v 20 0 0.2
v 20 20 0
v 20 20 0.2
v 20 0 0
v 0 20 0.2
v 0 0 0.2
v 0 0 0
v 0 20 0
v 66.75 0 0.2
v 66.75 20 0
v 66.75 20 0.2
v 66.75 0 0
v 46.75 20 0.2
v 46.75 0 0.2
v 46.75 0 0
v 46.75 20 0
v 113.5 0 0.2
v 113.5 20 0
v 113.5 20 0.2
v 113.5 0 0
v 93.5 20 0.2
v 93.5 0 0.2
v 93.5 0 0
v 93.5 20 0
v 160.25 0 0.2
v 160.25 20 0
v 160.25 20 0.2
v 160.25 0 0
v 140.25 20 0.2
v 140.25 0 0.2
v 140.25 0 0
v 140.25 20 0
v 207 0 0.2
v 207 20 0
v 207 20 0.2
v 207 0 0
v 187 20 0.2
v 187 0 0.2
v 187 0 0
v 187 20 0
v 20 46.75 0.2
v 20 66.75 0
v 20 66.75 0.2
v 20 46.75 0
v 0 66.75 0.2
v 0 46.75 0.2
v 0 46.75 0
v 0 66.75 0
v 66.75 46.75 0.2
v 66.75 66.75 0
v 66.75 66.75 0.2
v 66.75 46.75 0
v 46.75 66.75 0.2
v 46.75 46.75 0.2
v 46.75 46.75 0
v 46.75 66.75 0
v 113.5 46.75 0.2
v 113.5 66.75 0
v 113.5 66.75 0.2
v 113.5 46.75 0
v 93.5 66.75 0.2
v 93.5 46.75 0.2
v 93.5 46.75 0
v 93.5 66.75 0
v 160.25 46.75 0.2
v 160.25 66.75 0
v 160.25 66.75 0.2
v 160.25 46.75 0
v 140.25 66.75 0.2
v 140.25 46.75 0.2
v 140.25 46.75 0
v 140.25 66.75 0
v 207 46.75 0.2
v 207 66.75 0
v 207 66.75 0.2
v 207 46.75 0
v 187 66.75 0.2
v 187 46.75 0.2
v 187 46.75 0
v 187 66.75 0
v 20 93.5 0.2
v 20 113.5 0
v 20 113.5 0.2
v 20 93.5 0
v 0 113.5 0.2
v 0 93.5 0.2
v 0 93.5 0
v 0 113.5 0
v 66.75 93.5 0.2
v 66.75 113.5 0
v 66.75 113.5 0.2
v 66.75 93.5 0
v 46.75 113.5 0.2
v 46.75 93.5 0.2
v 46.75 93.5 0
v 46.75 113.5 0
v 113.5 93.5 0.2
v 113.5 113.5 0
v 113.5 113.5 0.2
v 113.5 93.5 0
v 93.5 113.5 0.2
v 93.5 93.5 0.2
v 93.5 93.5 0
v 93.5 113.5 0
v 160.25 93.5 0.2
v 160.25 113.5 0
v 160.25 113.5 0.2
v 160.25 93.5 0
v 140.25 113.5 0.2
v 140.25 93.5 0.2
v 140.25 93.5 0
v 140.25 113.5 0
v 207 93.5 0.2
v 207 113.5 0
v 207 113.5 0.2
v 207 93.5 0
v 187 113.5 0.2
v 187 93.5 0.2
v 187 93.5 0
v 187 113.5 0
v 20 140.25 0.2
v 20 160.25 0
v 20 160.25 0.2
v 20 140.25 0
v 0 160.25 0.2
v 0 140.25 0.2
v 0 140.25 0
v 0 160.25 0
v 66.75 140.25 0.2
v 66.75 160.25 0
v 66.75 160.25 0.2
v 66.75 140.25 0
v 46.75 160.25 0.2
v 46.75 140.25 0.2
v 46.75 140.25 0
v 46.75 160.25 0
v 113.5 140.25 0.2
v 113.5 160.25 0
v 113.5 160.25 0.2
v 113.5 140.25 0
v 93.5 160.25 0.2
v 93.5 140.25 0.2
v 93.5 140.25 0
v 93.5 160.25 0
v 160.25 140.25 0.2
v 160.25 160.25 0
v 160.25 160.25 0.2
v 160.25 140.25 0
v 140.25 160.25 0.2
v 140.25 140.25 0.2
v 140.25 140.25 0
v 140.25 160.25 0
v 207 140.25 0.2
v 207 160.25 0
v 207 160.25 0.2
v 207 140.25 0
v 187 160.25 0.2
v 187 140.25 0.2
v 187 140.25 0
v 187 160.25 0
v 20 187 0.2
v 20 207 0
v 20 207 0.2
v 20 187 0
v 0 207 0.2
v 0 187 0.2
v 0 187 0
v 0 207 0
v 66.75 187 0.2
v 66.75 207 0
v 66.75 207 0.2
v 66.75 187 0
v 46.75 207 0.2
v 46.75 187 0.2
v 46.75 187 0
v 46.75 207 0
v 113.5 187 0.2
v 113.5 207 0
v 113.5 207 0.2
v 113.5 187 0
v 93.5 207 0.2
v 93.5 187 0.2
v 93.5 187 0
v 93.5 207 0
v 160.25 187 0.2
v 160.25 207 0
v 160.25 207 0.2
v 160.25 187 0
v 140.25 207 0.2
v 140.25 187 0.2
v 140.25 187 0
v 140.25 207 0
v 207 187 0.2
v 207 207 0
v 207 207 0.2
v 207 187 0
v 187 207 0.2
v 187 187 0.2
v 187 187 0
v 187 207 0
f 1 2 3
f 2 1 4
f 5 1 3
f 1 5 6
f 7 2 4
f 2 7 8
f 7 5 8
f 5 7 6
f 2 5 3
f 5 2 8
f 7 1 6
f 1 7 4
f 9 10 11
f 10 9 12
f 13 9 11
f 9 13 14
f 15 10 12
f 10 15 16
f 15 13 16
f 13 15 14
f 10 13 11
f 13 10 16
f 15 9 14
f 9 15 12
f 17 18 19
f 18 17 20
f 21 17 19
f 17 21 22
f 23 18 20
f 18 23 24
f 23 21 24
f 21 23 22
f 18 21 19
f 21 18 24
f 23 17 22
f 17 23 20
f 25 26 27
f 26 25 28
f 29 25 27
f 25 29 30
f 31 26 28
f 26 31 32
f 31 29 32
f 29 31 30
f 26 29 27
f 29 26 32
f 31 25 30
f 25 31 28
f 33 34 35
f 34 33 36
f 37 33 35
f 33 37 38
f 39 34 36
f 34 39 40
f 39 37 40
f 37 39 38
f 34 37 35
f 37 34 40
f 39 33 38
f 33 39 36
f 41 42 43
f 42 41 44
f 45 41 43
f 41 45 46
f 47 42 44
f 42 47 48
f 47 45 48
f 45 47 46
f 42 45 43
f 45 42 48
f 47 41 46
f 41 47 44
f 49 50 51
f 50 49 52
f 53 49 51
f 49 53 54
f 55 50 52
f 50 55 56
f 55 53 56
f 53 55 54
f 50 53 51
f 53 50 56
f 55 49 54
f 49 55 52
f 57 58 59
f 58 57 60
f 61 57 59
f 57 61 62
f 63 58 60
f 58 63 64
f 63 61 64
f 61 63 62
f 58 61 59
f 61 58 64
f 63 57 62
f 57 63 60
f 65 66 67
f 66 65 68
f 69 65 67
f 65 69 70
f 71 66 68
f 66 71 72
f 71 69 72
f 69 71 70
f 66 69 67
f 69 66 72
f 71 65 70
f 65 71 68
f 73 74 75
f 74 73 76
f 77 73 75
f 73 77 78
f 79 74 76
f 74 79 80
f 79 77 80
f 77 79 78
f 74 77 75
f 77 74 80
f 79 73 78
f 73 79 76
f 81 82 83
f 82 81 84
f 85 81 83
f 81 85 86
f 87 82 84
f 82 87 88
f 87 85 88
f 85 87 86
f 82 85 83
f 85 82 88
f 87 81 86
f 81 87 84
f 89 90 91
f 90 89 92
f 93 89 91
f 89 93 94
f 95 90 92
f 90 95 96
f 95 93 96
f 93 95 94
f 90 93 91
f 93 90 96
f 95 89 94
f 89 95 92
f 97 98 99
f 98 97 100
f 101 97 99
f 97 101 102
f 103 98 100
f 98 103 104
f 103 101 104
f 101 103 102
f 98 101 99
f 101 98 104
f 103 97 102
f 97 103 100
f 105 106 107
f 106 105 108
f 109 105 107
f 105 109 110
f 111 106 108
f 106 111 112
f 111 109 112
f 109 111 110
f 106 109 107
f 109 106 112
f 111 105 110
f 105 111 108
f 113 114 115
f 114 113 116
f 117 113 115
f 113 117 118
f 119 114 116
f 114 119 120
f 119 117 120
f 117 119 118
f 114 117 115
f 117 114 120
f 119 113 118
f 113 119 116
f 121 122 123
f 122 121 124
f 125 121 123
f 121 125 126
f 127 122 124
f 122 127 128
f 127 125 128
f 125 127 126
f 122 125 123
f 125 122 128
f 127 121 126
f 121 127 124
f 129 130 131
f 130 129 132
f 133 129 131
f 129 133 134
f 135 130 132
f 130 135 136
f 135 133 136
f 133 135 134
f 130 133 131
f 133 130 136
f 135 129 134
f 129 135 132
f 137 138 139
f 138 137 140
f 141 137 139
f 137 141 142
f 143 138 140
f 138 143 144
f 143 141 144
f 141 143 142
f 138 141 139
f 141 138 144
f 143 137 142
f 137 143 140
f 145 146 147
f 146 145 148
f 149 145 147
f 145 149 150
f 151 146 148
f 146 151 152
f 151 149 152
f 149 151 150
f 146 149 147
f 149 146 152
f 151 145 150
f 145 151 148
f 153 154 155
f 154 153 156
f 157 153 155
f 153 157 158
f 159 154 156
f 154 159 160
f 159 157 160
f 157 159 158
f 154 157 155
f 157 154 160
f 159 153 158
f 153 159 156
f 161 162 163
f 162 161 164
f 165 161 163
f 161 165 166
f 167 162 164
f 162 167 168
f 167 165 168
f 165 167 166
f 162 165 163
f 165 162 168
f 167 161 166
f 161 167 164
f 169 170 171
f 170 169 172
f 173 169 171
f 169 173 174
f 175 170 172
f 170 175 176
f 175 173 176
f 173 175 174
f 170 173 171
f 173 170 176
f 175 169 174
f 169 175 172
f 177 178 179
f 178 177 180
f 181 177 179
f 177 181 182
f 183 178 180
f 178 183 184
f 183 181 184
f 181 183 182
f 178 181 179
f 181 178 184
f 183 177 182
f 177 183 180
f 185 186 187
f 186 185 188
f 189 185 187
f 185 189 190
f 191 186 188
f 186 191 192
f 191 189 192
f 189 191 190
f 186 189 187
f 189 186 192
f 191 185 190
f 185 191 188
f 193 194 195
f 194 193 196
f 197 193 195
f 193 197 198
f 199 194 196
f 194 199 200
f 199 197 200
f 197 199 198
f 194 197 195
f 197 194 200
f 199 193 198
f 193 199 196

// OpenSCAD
/*
Customizable Bed Leveling Test
Version 1.1
Written by kenwebart

Customize your own bed leveling test.

Please update your settings below.

License: Creative Commons Attribution-ShareAlike 4.0 International License
This is a human-readable summary of the full license below.

Under this license, you are free to:
Share - copy and redistribute the material in any medium or format
Adapt - remix, transform, and build upon the material for any purpose, even commercially.
The licensor cannot revoke these freedoms as long as you follow the license terms.

License terms

Attribution - You must give appropriate credit, provide a link to the license, and indicate if changes were made. You may do so in any reasonable manner, but not in any way that suggests the licensor endorses you or your use.
ShareAlike - If you remix, transform, or build upon the material, you must distribute your contributions under the same license as the original.
No additional restrictions - You may not apply legal terms or technological measures that legally restrict others from doing anything the license permits.

Notices

You do not have to comply with the license for elements of the material in the public domain or where your use is permitted by an applicable exception or limitation.
//No warranties are given. The license may not give you all of the permissions necessary for your intended use. For example, other rights such as publicity, privacy, or moral rights may limit how you use the material.
*/

/*
Use at your own risk.

THIS SOFTWARE IS PROVIDED BY THE COPYRIGHT HOLDERS AND CONTRIBUTORS "AS IS"
AND ANY EXPRESS OR IMPLIED WARRANTIES, INCLUDING, BUT NOT LIMITED TO,
THE IMPLIED WARRANTIES OF MERCHANTABILITY AND FITNESS FOR A PARTICULAR
PURPOSE ARE DISCLAIMED. IN NO EVENT SHALL THE COPYRIGHT OWNER OR CONTRIBUTORS
BE LIABLE FOR ANY DIRECT, INDIRECT, INCIDENTAL, SPECIAL, EXEMPLARY, OR
CONSEQUENTIAL DAMAGES (INCLUDING, BUT NOT LIMITED TO, PROCUREMENT OF
SUBSTITUTE GOODS OR SERVICES; LOSS OF USE, DATA, OR PROFITS; OR BUSINESS
INTERRUPTION) HOWEVER CAUSED AND ON ANY THEORY OF LIABILITY, WHETHER
IN CONTRACT, STRICT LIABILITY, OR TORT (INCLUDING NEGLIGENCE OR OTHERWISE)
ARISING IN ANY WAY OUT OF THE USE OF THIS SOFTWARE, EVEN IF ADVISED OF THE
POSSIBILITY OF SUCH DAMAGE.

*/

//width in mm.
printer_x = 210;

//depth in mm.
printer_y = 210; 

//height in mm.
printer_z = 205;

//diameter in mm.
nozzle = 0.4;

//height in mm.
layerheight = 0.2;

//Bild plate margin in mm.
margin = 1.5;

//in  mm. If needed, try 15.
skirt_padding = 0;

//Choose a shape
shape = 0; // [0,1,2,3]

//calculate space  
x = printer_x - (margin*2) - (skirt_padding*2);
y = printer_y - (margin*2) - (skirt_padding*2);
z = printer_z - margin;


//module for lines
 module line(start, end) {
    hull() {
        translate(start) linear_extrude(height = layerheight) circle(nozzle); 
        translate(end) linear_extrude(height = layerheight) circle(nozzle); 
    }
}


if (shape == 0) {
		//set cube size
		a = 20;
		cubesize = [a,a,layerheight];
		
		//calc space between cubes
		cubesInRow = 5;
		lengthCubes = a*cubesInRow;
		xLength = x - lengthCubes;
		space = xLength/(cubesInRow-1);
	

	for (j=[0:cubesInRow-1]) {
		padding_y = (a*j)+(space*j);
		for (i=[0:cubesInRow-1]) {
			padding_x = (a*i)+(space*i);
				translate([padding_x,padding_y]) cube(cubesize);
			}
		}
	}

if (shape == 1) {
		//set cube size
		a = 20;
		cubesize = [a,a,layerheight];
	
		translate([0,0]) cube(cubesize);
		translate([x-a,0]) cube(cubesize);
		translate([0,y-a]) cube(cubesize);
		translate([x-a,y-a]) cube(cubesize);
		translate([(x-a)/2,(y-a)/2]) cube(cubesize);
	}

if (shape == 2) {
    
    //set space between lines in mm
    space = 10;
    
    //calc how many lines possible
    linesPossible = round(((x+y)/2)/(space*2+nozzle*2));
    echo(linesPossible);

        for (i=[0:linesPossible]) {
            padding = space*i;
            line([0+padding,0+padding], [x-padding,0+padding]);
            line([x-padding,0+padding], [y-padding,y-padding]);
            line([y-padding,y-padding], [0+padding,y-padding]);
            line([0+padding,y-padding], [0+padding,0+padding]);
        }
    }


if (shape == 3) {
	cube([x,y,layerheight]);
	}
	
